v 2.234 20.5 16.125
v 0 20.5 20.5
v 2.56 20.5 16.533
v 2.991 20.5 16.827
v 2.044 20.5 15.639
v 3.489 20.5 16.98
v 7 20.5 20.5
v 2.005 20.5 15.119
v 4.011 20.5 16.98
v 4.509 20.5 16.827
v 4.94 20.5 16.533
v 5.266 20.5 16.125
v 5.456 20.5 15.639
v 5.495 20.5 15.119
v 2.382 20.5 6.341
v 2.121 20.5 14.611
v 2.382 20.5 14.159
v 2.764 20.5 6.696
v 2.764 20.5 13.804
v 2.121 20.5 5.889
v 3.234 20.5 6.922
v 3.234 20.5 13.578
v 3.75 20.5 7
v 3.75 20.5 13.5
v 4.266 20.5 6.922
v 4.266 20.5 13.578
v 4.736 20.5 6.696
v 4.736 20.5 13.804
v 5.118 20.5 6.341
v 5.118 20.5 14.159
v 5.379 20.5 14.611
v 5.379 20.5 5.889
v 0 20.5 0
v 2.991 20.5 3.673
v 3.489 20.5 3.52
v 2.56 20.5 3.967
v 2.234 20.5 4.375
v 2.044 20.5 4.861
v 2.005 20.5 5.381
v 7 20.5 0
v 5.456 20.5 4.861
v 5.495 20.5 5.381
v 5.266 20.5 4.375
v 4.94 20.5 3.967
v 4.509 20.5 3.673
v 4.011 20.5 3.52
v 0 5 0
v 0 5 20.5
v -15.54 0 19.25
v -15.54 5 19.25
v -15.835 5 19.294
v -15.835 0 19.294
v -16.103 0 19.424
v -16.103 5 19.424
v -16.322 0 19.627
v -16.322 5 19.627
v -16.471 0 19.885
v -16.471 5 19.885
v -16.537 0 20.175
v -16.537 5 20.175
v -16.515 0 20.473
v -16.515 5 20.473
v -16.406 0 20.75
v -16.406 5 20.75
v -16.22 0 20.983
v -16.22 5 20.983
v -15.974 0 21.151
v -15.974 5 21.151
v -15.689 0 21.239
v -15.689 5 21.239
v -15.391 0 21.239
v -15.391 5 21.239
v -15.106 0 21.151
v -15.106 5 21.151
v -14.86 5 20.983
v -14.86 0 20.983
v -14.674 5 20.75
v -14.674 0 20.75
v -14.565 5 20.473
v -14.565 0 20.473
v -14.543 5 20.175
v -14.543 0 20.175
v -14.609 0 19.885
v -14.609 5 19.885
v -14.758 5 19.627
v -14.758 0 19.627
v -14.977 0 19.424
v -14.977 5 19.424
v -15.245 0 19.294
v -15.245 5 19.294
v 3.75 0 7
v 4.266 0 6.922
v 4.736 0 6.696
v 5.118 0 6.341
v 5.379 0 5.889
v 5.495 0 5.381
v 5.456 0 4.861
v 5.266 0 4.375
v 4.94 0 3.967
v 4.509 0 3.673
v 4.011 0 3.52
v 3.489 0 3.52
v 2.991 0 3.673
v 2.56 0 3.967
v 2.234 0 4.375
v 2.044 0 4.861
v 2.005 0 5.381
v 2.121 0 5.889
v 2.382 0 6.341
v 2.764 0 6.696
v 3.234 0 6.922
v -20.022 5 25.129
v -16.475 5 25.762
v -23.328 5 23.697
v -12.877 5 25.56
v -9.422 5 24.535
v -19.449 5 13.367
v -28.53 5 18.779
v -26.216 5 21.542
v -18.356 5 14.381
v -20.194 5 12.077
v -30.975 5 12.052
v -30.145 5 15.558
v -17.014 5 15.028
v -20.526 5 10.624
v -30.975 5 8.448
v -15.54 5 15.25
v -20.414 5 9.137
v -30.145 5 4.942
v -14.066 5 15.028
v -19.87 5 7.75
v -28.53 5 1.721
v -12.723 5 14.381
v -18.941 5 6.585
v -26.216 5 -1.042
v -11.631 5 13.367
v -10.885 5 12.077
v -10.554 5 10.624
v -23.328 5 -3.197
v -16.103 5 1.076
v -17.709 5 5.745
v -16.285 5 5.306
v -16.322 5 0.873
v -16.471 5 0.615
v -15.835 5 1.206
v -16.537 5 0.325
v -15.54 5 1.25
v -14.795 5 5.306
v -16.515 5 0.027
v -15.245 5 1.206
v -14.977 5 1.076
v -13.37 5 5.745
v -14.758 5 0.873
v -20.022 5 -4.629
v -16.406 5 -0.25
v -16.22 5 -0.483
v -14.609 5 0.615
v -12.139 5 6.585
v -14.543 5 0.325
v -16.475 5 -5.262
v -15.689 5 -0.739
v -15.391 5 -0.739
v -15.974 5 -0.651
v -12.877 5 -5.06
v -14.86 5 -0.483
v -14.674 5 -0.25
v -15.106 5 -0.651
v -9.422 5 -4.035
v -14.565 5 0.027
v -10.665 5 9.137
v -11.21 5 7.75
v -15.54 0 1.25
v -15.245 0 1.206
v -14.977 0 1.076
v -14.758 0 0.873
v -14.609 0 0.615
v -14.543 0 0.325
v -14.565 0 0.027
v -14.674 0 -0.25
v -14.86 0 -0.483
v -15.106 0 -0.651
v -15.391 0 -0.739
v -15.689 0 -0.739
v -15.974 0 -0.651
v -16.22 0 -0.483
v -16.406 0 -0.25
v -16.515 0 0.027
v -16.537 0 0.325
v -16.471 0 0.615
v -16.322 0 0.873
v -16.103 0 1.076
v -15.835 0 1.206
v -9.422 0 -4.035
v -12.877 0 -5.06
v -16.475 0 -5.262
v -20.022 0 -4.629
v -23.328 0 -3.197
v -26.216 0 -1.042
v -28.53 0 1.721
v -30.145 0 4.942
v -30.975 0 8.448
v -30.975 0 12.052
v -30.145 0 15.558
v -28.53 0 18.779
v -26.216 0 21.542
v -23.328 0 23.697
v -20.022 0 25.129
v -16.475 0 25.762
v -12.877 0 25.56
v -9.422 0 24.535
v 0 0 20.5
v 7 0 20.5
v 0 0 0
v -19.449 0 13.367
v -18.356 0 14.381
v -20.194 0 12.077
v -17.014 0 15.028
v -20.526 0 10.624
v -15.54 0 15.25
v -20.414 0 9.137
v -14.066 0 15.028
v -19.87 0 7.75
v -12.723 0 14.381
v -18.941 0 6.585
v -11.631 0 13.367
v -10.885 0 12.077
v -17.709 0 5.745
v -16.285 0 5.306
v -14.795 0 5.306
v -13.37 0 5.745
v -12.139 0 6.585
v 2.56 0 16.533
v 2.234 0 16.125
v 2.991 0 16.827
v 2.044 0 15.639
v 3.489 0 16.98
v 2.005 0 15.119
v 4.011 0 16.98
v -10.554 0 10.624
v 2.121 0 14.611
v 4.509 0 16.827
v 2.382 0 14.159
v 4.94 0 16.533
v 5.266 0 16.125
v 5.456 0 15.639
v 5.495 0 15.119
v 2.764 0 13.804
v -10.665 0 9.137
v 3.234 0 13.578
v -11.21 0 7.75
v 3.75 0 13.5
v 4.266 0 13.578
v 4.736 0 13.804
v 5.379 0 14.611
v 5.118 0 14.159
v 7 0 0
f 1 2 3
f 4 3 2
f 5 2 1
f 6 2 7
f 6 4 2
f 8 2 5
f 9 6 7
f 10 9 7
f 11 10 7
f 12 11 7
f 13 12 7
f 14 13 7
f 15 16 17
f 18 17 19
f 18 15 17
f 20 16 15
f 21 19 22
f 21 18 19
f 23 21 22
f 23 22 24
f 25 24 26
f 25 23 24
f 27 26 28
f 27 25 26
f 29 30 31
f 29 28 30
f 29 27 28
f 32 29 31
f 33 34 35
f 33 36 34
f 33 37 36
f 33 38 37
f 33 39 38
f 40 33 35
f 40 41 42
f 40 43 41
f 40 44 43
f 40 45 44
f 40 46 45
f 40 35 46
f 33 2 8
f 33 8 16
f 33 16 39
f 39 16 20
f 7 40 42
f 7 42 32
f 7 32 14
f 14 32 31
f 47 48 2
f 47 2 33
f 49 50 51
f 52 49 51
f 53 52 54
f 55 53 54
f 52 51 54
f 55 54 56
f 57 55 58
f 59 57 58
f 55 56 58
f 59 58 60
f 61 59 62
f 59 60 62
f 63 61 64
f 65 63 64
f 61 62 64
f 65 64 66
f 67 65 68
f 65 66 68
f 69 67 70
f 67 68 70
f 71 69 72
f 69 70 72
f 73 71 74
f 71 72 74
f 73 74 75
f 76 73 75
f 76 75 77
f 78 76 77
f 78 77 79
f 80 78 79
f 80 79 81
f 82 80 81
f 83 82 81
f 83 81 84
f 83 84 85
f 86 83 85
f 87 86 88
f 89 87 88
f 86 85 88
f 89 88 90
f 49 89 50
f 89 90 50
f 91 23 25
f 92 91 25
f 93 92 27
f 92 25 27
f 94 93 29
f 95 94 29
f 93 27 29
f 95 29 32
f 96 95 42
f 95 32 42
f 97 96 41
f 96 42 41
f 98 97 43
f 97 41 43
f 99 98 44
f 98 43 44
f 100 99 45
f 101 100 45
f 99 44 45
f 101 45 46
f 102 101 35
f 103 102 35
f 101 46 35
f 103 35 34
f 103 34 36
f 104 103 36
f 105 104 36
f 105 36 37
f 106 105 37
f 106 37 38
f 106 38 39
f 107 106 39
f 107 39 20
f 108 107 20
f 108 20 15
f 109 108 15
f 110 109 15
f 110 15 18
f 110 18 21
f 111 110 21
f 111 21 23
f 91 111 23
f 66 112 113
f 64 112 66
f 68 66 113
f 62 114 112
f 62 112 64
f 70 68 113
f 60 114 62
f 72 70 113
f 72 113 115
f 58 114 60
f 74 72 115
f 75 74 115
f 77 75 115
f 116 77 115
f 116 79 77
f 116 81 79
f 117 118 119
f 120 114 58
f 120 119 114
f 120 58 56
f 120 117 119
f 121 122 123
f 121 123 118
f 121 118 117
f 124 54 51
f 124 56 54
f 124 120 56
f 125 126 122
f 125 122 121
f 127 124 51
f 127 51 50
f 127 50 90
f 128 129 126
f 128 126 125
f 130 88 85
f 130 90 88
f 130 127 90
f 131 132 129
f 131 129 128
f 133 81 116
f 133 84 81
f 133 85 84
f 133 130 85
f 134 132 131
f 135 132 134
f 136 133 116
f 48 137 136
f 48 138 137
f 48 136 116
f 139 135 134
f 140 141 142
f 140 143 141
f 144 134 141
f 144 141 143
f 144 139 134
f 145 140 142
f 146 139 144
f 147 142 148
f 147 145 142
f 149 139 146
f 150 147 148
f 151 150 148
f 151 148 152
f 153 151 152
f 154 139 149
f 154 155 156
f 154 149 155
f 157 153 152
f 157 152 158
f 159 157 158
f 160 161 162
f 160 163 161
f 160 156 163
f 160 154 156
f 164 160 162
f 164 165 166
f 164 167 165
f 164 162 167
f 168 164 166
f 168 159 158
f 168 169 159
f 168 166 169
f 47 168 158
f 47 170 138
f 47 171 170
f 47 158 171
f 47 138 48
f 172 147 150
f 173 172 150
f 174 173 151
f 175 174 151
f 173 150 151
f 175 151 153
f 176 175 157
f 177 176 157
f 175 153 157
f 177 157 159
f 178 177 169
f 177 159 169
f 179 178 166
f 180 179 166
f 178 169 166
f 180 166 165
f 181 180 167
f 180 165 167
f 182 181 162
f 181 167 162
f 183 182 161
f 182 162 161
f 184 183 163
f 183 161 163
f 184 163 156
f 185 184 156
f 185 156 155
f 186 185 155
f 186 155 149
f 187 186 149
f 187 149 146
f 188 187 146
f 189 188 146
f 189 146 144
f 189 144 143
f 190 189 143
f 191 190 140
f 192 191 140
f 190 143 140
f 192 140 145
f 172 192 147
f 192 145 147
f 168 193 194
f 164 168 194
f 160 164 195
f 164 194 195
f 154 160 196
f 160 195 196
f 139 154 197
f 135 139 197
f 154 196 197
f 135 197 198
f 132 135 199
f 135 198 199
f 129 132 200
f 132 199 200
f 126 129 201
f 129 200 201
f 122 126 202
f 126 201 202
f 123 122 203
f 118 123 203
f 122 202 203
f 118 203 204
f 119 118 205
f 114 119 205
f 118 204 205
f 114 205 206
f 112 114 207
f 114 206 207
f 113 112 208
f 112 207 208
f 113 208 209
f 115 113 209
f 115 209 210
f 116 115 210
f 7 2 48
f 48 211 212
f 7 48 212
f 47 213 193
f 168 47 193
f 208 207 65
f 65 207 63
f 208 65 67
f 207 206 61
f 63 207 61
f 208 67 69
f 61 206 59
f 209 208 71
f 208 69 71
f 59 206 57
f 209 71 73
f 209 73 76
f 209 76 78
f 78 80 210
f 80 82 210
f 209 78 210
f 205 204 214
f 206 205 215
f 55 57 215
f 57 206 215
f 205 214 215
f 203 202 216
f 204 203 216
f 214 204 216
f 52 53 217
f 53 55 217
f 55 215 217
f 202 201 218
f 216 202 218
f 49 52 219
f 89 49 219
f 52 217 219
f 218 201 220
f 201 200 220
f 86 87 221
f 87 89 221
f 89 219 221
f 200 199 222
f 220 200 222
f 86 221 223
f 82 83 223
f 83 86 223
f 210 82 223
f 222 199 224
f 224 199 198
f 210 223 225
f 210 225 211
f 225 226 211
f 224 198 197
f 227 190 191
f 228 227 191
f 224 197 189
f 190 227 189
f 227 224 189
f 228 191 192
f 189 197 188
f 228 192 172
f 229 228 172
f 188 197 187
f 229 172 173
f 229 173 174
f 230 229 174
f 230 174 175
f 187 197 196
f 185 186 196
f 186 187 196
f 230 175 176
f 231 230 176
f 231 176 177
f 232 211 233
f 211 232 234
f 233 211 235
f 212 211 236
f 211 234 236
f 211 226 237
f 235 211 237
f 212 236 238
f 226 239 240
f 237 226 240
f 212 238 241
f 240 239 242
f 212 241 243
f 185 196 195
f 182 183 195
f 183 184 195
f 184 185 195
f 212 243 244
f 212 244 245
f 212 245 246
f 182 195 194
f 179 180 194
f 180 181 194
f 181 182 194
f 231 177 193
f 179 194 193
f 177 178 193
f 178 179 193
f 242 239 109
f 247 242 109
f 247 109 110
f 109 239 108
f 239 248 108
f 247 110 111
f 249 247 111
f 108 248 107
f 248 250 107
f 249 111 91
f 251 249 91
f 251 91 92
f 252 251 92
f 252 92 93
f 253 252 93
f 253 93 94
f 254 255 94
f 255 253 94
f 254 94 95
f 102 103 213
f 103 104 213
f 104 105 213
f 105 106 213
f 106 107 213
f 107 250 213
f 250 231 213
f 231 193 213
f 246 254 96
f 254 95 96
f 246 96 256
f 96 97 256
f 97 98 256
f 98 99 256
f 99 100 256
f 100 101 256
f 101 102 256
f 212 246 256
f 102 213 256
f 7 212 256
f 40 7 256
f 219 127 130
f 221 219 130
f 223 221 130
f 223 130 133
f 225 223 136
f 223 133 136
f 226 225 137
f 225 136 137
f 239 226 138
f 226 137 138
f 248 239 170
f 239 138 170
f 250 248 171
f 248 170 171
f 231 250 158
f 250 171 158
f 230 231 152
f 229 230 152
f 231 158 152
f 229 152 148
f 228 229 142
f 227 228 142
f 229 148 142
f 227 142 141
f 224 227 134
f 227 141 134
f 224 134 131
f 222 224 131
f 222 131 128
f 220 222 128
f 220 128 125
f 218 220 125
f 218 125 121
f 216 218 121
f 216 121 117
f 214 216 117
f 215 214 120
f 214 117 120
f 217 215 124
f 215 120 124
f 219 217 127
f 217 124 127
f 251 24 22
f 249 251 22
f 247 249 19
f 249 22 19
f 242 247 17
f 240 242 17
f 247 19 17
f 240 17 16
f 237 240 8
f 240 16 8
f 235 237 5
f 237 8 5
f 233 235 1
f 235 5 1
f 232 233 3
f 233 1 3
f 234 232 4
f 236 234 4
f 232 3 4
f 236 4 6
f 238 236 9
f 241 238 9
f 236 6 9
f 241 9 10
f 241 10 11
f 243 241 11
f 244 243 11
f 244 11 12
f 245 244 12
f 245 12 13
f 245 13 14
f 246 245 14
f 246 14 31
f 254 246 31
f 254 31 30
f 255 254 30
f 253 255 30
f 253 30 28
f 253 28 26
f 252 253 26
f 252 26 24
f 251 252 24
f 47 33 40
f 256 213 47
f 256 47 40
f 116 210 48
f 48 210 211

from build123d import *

# Parameters (mm, degrees)
SKETCH1_W               = 7
SKETCH1_H               = 20.5
MOUNTINGBASE_DEPTH      = 20.50030868
SKETCH2_R               = 1.75
MOUNTINGHOLES_DEPTH     = 30.824698757
HORNTAB_DEPTH           = 5
SKETCH4_R               = 1
SKETCH4_R_2             = 5
HORNMOUNTINGHOLES_DEPTH = 5


with BuildPart() as part:
    # Sketch1 → mountingBase (new body)
    with BuildSketch(Plane(origin=(0, 0, 0), x_dir=(1, 0, 0), z_dir=(0, 1, 0))):
        with Locations((3.5, -10.25)):
            Rectangle(SKETCH1_W, SKETCH1_H)
    extrude(amount=MOUNTINGBASE_DEPTH)

    # Sketch2 → mountingHoles (cut, through all)
    with BuildSketch(Plane(origin=(0, 20.50030868, 0), x_dir=(1, 0, 0), z_dir=(0, 1, 0))):
        with Locations(Location((3.75, -5.25, 0), (0, 0, 270))):
            Circle(SKETCH2_R)
        with Locations(Location((3.75, -15.25, 0), (0, 0, 90))):
            Circle(SKETCH2_R)
    extrude(amount=-MOUNTINGHOLES_DEPTH, mode=Mode.SUBTRACT)

    # Sketch3 → hornTab (add)
    with BuildSketch(Plane(origin=(0, 0, 0), x_dir=(1, 0, 0), z_dir=(0, 1, 0))):
        with BuildLine():
            Line((0, 0), (-9.422358224, 4.035054584))
            ThreePointArc((-9.422358224, 4.035054584), (-31.07965246, -10.25), (-9.422358224, -24.535054584))
            Line((-9.422358224, -24.535054584), (0, -20.5))
            Line((0, -20.5), (0, 0))
        make_face()
    extrude(amount=HORNTAB_DEPTH)

    # Sketch4 → hornMountingHoles (cut)
    with BuildSketch(Plane(origin=(0, 5, 0), x_dir=(1, 0, 0), z_dir=(0, 1, 0))):
        with Locations(Location((-15.53982623, -0.25, 0), (0, 0, 270))):
            Circle(SKETCH4_R)
        with Locations(Location((-15.53982623, -20.25, 0), (0, 0, 90))):
            Circle(SKETCH4_R)
        with Locations(Location((-15.53982623, -10.25, 0), (0, 0, 270))):
            Circle(SKETCH4_R_2)
    extrude(amount=-HORNMOUNTINGHOLES_DEPTH, mode=Mode.SUBTRACT)


solid = part.part
